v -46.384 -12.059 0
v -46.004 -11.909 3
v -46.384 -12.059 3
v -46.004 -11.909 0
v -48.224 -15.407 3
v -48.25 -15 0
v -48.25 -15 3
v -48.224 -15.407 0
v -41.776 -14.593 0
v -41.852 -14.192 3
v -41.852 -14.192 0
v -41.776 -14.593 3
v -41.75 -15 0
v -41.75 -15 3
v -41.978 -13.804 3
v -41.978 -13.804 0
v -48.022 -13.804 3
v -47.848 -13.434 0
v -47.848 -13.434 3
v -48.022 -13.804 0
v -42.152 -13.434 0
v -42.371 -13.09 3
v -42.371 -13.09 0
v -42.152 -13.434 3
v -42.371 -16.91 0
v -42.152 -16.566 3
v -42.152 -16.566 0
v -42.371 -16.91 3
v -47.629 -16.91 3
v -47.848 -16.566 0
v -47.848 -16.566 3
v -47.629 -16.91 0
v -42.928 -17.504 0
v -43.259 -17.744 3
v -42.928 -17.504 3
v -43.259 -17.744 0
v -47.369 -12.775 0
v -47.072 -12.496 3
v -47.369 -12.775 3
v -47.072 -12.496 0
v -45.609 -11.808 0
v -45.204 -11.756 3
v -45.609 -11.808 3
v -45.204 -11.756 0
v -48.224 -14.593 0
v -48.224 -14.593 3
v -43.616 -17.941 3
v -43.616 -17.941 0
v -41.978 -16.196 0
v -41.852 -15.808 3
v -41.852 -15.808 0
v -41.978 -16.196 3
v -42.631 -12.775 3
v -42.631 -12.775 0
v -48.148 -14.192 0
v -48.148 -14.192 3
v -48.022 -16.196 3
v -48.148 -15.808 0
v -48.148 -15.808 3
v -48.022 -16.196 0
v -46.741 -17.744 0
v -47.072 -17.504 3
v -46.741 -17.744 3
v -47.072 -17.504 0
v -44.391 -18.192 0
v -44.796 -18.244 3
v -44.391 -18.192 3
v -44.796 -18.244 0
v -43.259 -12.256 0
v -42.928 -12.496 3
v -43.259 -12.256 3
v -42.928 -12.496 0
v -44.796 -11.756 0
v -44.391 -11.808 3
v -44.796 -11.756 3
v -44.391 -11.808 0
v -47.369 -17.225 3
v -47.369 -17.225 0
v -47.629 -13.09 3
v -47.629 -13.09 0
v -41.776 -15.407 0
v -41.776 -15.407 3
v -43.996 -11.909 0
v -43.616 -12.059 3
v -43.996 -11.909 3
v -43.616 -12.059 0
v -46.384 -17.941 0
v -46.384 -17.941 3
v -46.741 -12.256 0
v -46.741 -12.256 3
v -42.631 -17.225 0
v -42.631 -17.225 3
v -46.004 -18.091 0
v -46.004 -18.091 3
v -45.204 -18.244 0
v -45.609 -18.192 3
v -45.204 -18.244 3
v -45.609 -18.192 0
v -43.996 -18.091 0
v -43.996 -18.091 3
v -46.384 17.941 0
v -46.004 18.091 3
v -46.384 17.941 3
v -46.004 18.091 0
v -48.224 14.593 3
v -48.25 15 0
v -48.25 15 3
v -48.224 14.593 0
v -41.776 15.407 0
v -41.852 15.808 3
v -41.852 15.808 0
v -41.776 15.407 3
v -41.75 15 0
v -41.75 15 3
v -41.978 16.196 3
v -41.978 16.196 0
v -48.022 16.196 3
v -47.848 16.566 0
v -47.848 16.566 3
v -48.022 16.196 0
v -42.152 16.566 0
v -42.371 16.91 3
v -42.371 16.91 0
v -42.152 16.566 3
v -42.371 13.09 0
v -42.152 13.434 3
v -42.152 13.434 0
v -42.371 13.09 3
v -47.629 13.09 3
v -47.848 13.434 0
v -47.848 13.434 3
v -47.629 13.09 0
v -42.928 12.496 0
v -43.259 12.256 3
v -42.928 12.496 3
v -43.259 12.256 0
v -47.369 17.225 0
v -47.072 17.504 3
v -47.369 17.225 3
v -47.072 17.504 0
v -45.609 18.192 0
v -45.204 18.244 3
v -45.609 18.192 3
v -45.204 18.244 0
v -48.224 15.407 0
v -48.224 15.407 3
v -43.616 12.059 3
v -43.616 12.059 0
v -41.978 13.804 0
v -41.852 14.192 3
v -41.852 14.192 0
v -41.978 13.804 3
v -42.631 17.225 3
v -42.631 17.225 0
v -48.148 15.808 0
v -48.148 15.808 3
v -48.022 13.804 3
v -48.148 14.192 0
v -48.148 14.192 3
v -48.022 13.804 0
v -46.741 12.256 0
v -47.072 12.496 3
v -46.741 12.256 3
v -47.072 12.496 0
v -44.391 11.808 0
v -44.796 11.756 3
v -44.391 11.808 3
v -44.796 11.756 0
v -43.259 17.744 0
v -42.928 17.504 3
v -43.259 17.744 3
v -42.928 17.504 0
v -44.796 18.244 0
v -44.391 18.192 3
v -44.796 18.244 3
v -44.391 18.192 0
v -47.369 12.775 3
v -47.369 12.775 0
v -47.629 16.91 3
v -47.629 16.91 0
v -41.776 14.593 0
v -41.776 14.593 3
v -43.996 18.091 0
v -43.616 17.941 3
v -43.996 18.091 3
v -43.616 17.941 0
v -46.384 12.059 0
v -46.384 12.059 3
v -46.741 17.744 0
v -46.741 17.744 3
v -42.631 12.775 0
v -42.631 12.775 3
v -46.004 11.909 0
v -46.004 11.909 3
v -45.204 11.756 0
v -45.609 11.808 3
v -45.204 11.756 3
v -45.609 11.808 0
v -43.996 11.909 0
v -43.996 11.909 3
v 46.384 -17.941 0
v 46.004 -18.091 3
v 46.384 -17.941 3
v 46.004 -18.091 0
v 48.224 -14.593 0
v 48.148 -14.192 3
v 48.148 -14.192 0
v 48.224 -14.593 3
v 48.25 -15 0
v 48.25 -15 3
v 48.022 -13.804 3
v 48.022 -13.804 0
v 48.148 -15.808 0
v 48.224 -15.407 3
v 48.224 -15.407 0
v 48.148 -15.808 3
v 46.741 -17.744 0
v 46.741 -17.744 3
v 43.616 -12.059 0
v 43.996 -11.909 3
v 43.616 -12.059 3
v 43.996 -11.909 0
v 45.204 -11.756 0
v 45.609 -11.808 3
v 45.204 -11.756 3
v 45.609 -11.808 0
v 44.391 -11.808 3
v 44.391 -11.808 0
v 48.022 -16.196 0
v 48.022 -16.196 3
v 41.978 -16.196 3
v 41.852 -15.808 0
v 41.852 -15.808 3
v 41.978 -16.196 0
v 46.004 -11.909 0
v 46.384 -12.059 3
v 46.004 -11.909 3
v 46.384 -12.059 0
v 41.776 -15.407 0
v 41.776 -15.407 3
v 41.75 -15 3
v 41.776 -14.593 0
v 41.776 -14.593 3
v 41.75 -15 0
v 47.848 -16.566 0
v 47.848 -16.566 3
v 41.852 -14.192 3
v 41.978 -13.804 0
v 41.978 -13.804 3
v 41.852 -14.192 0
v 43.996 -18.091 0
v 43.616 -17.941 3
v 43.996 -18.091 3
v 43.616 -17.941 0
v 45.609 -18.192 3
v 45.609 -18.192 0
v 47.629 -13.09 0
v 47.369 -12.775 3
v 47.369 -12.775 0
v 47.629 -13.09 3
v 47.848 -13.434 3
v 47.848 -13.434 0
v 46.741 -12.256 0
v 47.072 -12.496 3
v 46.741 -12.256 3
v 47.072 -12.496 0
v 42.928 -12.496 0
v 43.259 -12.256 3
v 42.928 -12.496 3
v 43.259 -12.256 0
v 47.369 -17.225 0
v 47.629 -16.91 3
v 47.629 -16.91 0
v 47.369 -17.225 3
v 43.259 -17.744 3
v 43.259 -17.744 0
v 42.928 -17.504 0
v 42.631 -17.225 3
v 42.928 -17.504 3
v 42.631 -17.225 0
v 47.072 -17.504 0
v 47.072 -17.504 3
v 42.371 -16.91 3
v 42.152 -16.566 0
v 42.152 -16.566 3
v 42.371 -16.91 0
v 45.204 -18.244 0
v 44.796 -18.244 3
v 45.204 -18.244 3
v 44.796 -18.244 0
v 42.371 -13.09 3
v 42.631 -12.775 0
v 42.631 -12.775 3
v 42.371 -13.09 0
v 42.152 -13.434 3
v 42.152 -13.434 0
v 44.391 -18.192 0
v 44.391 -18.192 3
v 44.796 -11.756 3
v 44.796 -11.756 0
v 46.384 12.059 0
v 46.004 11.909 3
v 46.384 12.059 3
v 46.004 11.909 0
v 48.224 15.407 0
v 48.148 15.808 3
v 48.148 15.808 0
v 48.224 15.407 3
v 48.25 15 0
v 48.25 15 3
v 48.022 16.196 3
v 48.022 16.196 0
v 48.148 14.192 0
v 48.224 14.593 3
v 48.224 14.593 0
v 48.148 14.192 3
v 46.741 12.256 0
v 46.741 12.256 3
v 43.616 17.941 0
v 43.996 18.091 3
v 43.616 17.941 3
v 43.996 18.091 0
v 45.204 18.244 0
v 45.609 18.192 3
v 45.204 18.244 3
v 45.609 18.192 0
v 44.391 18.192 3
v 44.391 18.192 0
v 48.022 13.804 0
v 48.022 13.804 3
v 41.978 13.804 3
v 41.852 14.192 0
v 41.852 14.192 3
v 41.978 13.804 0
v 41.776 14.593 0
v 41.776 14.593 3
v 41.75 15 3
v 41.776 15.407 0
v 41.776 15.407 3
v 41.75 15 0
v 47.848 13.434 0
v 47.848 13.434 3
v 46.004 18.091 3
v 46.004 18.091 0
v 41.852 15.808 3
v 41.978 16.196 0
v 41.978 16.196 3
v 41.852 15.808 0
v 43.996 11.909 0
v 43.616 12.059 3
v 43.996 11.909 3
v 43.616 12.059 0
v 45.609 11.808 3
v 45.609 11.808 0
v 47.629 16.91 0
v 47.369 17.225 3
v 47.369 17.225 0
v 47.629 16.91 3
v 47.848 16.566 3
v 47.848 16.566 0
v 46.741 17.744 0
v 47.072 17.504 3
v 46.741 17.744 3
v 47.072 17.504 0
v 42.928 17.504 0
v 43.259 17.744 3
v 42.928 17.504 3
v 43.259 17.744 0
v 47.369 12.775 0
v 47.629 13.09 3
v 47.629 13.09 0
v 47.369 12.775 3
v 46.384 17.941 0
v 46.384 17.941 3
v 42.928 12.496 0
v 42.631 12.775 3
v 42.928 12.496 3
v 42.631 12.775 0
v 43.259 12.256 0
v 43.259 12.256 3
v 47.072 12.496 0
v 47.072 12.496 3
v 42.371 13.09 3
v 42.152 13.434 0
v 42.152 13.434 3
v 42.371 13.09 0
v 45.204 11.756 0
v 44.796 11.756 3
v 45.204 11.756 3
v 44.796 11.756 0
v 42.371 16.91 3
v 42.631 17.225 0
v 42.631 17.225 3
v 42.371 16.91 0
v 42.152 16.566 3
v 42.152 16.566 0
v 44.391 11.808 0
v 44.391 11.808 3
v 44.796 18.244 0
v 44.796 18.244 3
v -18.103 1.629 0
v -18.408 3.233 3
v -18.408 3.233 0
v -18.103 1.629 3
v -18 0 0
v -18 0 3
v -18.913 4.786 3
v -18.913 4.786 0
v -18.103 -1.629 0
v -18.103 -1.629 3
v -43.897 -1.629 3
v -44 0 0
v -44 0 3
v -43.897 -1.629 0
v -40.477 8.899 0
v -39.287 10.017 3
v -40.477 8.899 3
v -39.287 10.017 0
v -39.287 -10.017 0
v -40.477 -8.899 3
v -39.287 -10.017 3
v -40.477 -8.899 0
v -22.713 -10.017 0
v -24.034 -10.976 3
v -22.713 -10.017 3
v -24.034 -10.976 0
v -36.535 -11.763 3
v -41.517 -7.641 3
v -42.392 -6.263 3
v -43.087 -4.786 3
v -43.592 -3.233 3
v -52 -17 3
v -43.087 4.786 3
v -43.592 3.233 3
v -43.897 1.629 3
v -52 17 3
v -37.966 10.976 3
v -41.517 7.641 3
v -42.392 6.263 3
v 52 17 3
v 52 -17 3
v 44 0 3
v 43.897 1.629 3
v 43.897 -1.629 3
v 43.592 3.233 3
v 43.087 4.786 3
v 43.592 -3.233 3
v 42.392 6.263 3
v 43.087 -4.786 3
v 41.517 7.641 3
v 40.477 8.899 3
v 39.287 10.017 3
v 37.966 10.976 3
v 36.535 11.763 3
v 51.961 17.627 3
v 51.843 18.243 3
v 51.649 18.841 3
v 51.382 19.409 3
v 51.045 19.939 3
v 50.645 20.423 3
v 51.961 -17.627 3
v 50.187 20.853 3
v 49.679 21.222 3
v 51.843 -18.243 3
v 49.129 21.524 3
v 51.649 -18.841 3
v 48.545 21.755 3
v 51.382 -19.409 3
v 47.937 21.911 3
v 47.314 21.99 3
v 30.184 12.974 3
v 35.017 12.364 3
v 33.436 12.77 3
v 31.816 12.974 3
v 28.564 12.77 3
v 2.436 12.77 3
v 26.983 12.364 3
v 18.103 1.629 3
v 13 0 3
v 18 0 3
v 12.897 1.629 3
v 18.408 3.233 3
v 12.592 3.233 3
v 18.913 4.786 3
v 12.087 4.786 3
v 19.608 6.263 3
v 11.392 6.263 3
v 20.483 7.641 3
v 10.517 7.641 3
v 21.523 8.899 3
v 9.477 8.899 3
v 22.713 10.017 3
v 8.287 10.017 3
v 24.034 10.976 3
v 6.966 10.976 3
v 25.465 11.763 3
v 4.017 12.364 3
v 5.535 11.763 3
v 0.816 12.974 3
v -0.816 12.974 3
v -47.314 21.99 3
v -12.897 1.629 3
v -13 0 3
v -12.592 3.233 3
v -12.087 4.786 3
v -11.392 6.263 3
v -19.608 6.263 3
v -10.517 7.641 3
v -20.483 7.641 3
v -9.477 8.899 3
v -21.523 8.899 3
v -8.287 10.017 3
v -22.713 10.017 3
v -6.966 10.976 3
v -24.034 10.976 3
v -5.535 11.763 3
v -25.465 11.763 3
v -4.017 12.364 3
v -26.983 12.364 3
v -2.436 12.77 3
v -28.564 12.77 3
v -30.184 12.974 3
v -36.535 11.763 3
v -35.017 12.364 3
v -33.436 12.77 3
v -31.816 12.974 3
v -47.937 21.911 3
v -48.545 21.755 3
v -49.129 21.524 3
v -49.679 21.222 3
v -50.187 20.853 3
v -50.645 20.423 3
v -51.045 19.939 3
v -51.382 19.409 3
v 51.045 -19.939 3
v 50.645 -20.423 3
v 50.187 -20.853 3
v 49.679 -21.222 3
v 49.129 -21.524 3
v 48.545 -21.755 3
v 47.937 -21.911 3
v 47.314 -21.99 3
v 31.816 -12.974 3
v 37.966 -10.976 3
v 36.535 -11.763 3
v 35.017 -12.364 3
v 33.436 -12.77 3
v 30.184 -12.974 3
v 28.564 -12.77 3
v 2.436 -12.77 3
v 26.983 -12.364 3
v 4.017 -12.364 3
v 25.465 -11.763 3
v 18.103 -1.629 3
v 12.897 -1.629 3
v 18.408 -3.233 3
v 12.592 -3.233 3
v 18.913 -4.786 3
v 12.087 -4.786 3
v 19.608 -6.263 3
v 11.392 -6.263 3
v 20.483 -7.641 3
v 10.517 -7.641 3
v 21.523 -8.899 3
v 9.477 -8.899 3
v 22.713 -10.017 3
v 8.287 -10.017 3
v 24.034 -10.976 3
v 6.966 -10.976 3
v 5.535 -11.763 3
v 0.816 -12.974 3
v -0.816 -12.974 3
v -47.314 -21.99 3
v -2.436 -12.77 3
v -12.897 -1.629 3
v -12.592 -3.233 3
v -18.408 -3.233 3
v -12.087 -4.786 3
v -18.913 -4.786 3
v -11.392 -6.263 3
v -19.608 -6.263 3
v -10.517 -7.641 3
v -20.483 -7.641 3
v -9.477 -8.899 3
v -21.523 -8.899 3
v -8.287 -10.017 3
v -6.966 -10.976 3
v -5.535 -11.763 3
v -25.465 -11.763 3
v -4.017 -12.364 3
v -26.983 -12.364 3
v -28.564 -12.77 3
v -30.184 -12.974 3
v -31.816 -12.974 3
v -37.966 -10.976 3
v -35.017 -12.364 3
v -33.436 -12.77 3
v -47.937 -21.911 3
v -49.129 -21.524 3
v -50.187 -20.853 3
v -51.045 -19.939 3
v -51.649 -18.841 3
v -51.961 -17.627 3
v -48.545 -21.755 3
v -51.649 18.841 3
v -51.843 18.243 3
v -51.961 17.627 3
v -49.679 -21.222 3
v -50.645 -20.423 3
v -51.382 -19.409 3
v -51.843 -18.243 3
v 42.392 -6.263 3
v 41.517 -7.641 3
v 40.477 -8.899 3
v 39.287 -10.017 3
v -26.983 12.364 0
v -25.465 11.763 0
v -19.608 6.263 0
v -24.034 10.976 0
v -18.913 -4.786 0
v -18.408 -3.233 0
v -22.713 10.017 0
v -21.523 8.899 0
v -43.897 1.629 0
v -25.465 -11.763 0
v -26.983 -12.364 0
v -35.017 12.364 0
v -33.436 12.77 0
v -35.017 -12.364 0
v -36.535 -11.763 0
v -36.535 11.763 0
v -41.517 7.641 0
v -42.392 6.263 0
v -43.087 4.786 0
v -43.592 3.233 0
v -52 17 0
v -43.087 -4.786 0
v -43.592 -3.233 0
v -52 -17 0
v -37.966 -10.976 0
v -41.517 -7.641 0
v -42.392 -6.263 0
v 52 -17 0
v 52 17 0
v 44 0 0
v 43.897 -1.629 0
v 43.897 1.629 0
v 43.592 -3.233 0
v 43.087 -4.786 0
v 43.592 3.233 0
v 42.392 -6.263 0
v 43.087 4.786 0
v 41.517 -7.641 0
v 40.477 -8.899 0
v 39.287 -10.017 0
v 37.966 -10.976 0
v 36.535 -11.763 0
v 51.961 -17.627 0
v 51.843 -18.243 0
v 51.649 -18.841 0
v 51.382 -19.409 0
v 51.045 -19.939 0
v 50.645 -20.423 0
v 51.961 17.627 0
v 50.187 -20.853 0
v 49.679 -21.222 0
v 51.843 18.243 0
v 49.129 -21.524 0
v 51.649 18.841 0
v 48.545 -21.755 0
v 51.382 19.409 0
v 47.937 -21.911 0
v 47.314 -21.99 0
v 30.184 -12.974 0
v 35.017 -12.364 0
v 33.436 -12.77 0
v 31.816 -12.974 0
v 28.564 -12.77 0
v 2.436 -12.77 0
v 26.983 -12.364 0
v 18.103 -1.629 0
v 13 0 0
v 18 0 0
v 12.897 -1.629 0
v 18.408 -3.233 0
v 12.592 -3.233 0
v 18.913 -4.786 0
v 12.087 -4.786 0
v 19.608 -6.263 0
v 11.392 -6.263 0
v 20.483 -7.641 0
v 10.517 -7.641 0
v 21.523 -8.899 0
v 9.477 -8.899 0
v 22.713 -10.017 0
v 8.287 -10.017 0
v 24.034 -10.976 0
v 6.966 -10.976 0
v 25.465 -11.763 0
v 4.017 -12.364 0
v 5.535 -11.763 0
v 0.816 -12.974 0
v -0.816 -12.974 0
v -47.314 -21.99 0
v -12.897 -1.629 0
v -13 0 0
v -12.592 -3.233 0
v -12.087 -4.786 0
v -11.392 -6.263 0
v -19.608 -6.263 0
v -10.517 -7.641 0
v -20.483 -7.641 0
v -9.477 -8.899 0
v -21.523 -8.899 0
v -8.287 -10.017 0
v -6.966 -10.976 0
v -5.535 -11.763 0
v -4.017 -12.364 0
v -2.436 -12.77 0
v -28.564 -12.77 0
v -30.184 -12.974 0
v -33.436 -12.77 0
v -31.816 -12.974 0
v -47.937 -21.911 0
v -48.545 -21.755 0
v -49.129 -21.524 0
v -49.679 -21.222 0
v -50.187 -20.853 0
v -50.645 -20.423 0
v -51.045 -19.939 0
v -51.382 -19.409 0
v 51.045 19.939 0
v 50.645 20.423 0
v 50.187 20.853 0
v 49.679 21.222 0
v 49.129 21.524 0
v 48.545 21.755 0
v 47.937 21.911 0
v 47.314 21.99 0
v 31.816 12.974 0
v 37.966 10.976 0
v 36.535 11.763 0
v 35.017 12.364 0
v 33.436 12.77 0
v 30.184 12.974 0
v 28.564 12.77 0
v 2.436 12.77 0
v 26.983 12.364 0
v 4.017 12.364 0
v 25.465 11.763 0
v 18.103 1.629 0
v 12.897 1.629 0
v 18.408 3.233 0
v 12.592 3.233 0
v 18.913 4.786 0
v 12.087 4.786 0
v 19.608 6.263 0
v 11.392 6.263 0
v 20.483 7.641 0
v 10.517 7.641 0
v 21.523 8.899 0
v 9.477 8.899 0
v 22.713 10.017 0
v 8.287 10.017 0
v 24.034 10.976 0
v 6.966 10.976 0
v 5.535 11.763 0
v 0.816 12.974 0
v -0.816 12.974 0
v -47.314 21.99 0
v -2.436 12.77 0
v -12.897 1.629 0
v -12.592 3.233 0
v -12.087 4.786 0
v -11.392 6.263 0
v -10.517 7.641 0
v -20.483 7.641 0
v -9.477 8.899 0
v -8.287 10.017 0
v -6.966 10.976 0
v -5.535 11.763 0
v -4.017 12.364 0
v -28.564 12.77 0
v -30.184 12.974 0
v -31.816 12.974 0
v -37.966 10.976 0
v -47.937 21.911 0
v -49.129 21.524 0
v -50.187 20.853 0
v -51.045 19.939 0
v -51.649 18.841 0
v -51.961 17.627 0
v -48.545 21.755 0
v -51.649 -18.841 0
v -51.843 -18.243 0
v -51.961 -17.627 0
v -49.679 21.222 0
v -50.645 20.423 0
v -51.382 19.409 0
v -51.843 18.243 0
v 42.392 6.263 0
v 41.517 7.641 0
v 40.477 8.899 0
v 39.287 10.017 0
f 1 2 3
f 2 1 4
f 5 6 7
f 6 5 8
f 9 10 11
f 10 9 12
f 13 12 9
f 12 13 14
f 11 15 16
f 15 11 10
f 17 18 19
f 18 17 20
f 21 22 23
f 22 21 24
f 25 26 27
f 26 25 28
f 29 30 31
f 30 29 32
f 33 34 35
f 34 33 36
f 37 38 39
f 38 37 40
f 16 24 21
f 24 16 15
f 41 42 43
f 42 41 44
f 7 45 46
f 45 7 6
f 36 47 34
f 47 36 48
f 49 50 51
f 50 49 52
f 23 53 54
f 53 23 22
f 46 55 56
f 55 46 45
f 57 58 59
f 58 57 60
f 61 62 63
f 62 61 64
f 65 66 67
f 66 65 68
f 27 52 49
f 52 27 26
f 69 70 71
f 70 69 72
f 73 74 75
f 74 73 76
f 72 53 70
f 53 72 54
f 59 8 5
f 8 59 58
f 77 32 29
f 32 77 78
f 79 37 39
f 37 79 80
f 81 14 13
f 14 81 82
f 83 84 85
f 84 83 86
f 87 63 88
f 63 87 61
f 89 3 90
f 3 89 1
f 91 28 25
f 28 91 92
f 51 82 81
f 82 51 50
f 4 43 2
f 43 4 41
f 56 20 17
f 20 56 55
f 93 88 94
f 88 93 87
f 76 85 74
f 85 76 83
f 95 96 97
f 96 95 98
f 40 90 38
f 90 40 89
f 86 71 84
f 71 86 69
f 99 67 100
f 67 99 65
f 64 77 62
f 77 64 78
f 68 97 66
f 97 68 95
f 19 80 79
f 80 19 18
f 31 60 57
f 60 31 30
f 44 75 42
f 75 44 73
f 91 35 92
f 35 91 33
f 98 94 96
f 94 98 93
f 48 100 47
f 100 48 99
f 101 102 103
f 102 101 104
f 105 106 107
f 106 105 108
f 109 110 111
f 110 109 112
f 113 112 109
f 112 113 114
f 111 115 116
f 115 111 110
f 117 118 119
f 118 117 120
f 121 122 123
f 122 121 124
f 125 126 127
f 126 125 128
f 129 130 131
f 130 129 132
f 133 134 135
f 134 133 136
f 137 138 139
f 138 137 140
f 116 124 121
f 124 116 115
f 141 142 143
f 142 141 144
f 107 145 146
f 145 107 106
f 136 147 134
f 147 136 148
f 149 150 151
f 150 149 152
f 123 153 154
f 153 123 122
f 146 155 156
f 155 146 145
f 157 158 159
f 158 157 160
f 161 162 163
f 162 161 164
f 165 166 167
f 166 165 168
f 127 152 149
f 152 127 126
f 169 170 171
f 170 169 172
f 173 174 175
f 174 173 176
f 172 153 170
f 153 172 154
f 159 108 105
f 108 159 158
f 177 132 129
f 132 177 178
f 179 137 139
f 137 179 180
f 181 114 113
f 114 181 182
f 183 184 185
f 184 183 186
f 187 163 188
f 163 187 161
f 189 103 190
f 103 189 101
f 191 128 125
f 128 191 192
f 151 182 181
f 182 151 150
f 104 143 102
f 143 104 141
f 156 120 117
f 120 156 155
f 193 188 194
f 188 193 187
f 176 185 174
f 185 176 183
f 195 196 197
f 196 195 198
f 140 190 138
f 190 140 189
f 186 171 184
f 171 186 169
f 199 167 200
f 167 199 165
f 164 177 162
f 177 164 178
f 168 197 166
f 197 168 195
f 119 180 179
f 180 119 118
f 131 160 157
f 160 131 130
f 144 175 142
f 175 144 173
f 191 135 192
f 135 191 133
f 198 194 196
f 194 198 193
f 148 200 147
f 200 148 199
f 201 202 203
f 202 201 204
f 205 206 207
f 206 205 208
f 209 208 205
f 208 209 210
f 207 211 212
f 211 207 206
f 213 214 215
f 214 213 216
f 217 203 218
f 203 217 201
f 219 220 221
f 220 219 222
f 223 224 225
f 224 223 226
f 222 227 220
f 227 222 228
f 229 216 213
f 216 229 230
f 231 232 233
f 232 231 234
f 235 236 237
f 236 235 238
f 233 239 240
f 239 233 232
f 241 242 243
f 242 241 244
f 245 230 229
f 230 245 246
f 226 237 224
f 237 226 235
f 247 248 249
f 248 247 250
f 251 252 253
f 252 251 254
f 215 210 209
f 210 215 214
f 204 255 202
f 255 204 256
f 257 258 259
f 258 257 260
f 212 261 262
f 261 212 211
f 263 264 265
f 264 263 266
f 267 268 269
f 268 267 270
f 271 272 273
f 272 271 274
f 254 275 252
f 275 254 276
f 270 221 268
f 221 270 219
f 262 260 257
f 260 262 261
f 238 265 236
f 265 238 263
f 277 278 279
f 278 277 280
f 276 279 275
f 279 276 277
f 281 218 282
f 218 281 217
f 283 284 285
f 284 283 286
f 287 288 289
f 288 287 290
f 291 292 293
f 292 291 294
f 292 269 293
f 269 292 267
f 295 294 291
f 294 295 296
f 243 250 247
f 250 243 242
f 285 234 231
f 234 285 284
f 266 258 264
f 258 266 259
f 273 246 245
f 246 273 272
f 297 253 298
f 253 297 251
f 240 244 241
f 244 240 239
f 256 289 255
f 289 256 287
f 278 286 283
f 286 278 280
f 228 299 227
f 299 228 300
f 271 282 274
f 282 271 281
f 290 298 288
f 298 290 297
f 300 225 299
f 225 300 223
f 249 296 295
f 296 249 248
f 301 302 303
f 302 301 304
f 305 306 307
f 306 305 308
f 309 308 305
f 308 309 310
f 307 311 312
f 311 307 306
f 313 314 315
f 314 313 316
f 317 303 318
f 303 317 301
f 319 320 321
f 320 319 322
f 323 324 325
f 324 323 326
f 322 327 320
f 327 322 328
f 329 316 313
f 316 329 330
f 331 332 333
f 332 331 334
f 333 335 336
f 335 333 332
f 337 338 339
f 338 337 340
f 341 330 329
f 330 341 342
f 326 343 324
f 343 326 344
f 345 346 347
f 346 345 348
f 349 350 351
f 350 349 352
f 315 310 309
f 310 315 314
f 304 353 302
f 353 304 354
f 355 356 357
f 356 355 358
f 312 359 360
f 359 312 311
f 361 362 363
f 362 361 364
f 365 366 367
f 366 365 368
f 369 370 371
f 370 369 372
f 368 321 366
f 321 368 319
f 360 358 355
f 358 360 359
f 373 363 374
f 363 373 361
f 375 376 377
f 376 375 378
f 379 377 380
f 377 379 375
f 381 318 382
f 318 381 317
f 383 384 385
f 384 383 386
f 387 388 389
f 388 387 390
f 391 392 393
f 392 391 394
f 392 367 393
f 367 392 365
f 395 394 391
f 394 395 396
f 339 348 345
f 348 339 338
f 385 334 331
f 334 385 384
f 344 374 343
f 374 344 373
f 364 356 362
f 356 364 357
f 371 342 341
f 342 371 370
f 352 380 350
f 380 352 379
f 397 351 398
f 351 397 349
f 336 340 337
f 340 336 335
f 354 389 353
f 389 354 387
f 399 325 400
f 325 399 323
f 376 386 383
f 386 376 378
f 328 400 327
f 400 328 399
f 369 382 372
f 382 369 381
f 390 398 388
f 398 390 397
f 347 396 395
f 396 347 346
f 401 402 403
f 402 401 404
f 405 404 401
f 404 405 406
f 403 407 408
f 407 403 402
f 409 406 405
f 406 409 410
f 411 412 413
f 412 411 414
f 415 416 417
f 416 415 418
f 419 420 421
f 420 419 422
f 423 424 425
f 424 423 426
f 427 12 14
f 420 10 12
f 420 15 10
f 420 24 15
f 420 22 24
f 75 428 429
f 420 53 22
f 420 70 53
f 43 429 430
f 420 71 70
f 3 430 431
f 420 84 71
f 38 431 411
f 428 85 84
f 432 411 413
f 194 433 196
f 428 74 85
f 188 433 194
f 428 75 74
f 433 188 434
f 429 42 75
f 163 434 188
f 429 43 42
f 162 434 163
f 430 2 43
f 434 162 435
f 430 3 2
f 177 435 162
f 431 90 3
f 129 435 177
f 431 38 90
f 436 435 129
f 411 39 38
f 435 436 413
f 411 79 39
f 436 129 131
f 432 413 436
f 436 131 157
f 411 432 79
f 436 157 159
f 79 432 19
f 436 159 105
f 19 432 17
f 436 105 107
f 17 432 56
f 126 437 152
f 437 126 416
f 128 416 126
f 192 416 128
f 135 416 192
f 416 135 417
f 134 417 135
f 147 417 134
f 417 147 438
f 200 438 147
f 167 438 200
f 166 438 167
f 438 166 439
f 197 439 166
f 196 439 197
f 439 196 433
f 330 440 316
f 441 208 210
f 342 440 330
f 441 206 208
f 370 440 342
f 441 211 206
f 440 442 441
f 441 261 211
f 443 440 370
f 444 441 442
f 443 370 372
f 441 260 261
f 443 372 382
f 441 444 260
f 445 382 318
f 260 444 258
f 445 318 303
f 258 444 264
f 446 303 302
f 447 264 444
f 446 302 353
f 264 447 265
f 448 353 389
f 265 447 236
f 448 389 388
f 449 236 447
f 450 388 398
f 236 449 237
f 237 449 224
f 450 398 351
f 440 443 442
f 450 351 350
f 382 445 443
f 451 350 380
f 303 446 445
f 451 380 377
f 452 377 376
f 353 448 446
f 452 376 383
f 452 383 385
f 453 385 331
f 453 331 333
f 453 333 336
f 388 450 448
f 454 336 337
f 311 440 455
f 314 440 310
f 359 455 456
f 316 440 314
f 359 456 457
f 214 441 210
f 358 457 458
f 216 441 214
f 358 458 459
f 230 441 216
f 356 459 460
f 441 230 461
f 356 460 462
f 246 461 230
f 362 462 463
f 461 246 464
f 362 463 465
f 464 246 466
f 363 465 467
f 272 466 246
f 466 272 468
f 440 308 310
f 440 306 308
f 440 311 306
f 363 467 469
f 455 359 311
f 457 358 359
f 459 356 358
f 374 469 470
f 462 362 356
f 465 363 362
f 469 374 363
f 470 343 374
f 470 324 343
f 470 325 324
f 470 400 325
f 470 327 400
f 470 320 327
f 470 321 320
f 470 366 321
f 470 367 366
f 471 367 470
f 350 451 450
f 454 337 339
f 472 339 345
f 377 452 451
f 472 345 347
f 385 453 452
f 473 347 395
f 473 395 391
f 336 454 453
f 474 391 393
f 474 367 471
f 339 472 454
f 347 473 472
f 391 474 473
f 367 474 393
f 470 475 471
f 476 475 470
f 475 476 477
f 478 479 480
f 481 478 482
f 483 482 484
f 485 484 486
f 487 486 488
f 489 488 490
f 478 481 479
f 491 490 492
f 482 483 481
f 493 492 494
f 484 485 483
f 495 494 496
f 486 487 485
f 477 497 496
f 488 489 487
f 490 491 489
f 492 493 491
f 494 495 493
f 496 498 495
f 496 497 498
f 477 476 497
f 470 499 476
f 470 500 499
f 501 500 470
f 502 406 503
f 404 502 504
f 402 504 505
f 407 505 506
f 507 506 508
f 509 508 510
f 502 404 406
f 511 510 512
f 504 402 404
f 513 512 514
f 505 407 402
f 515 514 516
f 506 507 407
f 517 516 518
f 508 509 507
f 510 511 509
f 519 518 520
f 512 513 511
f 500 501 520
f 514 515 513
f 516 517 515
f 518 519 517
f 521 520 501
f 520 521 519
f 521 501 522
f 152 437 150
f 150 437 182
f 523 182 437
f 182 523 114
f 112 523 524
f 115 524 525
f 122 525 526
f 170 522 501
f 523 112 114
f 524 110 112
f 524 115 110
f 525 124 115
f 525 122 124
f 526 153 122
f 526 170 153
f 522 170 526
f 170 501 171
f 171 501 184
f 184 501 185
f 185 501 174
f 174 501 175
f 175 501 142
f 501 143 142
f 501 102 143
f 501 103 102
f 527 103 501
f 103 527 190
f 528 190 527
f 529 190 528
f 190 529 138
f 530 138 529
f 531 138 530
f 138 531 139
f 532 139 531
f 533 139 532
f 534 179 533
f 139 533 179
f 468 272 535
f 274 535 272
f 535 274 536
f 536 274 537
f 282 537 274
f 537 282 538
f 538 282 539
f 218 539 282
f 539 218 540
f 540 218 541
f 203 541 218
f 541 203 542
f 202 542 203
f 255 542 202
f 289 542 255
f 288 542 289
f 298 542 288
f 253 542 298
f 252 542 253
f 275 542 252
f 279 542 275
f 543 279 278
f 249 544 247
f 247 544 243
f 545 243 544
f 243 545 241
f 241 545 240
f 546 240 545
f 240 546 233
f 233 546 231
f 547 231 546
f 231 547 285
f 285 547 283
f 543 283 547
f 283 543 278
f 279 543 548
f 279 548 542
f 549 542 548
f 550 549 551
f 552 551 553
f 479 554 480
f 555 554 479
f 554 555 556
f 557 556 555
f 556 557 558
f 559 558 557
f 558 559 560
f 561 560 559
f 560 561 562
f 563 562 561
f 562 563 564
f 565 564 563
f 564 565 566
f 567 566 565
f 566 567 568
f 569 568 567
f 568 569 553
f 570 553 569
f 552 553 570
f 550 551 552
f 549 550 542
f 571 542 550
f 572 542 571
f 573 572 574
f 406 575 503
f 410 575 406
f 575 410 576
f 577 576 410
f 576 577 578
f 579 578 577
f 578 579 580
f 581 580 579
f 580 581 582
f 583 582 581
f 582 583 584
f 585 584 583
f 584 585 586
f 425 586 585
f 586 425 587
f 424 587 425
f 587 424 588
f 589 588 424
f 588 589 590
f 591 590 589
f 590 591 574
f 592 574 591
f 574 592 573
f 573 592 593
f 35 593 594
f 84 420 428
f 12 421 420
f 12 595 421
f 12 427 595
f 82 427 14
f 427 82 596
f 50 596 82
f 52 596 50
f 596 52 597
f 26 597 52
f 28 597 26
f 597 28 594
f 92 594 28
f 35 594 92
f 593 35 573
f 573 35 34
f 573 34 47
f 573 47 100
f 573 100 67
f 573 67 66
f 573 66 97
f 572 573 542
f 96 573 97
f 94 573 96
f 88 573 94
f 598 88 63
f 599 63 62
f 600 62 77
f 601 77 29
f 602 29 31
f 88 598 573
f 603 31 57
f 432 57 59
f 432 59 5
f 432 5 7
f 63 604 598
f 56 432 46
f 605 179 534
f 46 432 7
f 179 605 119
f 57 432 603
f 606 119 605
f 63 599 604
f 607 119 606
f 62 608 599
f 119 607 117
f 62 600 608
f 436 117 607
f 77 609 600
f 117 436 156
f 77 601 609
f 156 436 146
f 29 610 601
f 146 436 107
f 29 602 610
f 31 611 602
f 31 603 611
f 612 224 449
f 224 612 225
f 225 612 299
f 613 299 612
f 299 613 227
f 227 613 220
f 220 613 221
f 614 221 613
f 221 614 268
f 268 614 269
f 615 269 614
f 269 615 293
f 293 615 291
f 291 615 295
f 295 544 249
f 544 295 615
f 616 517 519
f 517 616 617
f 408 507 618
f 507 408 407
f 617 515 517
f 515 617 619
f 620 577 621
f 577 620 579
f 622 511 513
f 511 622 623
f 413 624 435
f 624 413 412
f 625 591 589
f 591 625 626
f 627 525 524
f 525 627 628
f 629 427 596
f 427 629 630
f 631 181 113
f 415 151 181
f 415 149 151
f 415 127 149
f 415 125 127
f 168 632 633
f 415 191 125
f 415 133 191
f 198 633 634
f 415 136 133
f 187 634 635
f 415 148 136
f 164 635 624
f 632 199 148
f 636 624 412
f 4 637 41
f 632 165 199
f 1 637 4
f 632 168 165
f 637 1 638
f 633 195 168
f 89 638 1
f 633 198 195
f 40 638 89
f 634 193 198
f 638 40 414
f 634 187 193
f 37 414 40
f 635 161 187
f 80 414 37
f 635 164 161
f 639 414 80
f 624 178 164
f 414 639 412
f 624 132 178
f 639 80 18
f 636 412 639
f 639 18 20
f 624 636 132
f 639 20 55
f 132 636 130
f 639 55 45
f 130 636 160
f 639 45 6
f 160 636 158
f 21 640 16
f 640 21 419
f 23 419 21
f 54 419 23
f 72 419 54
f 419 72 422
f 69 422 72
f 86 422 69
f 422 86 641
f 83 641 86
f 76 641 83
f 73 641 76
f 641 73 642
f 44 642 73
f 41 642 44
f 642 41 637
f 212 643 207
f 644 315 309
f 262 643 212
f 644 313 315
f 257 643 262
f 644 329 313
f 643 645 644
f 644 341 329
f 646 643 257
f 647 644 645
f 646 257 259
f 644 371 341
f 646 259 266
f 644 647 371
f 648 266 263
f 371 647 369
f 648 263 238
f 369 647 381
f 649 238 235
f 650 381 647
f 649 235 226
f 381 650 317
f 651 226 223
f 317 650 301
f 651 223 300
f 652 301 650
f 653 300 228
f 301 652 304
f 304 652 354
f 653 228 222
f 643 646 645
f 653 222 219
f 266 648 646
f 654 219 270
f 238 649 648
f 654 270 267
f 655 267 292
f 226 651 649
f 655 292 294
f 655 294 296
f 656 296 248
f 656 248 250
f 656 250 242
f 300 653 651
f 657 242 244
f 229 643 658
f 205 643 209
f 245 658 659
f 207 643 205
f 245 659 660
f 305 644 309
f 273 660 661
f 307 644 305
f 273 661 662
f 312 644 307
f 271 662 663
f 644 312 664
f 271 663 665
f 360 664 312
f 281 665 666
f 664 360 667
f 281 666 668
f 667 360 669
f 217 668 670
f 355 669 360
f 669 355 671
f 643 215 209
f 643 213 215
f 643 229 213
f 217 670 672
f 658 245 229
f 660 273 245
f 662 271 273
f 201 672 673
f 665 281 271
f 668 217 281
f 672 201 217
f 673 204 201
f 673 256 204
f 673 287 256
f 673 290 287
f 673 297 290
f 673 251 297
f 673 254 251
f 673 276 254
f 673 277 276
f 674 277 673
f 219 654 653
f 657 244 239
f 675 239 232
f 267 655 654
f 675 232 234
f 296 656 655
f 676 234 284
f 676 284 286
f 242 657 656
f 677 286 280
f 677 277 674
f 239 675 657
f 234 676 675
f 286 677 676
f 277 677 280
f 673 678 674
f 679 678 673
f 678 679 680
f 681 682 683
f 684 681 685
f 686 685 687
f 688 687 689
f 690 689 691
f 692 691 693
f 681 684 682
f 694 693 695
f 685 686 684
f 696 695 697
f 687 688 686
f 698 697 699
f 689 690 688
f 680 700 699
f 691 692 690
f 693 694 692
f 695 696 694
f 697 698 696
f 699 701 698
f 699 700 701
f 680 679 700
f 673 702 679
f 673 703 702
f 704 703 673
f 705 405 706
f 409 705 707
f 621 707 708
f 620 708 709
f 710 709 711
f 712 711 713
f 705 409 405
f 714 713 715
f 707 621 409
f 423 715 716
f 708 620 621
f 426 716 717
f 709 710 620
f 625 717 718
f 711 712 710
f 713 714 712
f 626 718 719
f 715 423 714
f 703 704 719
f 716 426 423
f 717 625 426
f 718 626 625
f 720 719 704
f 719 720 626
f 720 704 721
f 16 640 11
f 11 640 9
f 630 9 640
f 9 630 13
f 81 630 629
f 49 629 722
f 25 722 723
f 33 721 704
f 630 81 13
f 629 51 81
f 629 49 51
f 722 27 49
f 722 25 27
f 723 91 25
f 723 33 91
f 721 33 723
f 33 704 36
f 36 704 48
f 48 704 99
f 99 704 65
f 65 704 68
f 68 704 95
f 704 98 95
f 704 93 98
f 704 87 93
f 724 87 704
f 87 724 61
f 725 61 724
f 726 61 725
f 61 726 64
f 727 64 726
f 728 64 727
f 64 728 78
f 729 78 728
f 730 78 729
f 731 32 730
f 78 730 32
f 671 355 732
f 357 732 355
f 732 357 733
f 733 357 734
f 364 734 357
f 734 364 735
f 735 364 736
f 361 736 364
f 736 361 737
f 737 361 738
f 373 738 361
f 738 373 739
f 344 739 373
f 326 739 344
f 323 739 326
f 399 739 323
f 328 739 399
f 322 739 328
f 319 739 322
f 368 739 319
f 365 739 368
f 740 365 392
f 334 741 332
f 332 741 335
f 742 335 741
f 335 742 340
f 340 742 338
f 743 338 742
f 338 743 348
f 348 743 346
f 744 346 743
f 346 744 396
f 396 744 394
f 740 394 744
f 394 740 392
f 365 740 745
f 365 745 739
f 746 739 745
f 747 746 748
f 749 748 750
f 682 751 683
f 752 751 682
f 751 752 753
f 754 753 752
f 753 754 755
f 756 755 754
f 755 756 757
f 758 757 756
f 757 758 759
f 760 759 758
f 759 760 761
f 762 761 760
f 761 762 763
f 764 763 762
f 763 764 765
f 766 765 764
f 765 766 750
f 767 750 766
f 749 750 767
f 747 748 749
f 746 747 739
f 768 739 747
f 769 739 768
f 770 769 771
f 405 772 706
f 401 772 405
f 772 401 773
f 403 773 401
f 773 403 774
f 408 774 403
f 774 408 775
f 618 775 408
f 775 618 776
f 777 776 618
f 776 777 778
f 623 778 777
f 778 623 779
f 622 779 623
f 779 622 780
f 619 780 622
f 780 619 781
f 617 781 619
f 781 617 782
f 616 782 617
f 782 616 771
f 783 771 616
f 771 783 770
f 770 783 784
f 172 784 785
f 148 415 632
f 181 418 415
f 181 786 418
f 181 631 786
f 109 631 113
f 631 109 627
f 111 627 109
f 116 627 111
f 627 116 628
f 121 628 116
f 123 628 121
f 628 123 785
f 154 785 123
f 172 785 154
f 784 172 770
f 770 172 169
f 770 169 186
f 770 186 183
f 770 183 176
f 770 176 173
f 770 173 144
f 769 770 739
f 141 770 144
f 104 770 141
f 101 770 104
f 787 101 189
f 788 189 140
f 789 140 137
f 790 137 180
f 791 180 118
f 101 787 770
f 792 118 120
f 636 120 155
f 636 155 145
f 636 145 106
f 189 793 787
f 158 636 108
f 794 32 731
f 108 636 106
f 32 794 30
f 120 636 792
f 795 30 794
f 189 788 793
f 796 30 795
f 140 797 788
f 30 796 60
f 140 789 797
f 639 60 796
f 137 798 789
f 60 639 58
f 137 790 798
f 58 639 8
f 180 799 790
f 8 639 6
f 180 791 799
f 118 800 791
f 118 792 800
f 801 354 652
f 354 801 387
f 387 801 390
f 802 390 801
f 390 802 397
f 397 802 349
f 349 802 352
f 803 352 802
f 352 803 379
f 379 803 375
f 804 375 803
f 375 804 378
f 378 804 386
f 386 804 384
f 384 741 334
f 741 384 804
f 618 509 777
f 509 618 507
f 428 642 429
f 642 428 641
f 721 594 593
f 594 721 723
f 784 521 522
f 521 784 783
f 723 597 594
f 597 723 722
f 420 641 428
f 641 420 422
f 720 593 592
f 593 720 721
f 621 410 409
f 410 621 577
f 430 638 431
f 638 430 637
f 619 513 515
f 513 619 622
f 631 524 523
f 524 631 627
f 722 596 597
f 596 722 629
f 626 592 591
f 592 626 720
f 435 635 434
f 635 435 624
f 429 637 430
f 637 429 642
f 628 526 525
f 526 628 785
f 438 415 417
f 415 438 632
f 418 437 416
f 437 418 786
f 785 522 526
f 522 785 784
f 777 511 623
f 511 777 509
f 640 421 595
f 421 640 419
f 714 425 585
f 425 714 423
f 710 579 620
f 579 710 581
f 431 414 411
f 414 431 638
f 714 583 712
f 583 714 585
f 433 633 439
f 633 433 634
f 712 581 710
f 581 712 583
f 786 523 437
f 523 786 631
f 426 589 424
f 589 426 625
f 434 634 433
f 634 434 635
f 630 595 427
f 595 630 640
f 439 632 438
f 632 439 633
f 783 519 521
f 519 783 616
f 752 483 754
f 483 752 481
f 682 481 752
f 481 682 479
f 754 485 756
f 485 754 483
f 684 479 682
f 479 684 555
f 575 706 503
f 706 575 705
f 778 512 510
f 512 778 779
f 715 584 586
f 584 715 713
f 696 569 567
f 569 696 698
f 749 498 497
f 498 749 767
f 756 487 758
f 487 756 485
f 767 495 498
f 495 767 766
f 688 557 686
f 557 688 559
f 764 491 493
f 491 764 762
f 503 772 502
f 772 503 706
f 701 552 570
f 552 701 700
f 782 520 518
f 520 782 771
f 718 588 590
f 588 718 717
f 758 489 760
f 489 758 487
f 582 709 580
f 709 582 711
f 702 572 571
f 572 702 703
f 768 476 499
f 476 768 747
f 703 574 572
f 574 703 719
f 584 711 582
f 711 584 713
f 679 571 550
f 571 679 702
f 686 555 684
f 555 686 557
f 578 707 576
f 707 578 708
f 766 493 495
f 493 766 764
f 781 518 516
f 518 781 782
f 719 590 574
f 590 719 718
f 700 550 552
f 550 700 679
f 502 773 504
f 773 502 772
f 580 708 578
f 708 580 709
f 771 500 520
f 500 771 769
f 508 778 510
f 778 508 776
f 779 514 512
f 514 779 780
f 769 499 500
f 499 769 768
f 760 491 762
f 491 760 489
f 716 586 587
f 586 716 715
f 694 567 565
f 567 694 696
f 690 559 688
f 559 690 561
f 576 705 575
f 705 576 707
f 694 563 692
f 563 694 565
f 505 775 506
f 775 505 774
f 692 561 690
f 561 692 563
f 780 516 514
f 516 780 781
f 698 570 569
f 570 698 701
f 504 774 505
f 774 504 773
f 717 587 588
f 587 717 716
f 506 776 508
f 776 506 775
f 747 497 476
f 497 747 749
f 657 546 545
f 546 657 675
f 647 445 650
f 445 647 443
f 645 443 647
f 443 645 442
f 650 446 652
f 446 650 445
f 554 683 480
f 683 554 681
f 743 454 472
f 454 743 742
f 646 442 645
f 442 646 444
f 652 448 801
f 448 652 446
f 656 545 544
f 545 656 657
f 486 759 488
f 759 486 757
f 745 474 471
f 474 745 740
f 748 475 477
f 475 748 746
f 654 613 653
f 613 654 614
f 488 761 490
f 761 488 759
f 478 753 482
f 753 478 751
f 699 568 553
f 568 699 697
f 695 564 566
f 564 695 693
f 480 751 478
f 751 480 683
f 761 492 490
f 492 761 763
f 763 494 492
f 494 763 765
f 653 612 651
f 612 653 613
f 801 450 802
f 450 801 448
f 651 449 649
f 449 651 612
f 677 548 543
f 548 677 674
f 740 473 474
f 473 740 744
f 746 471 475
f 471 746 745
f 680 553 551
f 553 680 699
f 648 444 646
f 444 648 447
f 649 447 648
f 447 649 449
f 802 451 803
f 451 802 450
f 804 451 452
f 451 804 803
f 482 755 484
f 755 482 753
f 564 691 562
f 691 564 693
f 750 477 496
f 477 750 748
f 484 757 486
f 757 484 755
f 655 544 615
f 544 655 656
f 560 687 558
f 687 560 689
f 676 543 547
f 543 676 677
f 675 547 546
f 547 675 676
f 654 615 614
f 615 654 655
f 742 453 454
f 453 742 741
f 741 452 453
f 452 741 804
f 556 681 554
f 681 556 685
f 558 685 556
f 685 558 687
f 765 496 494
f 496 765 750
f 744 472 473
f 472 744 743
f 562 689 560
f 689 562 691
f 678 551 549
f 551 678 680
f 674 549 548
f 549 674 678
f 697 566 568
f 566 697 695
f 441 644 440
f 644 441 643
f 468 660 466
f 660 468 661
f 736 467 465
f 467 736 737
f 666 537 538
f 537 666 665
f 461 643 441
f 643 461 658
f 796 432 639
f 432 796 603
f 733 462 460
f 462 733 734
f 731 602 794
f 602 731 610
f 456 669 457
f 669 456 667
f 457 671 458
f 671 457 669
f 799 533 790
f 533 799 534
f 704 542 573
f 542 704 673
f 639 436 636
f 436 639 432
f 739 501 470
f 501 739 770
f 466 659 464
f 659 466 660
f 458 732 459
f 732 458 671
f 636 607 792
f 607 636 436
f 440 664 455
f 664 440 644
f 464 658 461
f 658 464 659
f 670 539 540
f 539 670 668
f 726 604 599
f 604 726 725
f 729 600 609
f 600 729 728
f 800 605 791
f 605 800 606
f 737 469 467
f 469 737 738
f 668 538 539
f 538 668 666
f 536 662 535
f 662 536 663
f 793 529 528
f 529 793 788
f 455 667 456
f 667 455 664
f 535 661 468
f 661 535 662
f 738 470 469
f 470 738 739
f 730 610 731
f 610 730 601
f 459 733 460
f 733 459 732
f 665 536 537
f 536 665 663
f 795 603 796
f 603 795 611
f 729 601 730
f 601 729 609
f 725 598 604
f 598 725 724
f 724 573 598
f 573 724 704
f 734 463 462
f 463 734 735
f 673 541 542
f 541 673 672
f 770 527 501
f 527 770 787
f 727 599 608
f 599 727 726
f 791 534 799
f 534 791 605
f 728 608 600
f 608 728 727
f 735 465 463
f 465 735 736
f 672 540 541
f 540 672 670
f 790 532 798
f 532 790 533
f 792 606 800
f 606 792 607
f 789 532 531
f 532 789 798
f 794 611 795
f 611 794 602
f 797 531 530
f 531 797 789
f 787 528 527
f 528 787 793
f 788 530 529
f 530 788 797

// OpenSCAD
$fn = 50;


difference() {
	union() {
		hull() {
			translate(v = [-47.0000000000, 17.0000000000, 0]) {
				cylinder(h = 3, r = 5);
			}
			translate(v = [47.0000000000, 17.0000000000, 0]) {
				cylinder(h = 3, r = 5);
			}
			translate(v = [-47.0000000000, -17.0000000000, 0]) {
				cylinder(h = 3, r = 5);
			}
			translate(v = [47.0000000000, -17.0000000000, 0]) {
				cylinder(h = 3, r = 5);
			}
		}
	}
	union() {
		#translate(v = [-45.0000000000, -15.0000000000, -100.0000000000]) {
			cylinder(h = 200, r = 3.2500000000);
		}
		#translate(v = [-45.0000000000, 15.0000000000, -100.0000000000]) {
			cylinder(h = 200, r = 3.2500000000);
		}
		#translate(v = [45.0000000000, -15.0000000000, -100.0000000000]) {
			cylinder(h = 200, r = 3.2500000000);
		}
		#translate(v = [45.0000000000, 15.0000000000, -100.0000000000]) {
			cylinder(h = 200, r = 3.2500000000);
		}
		#translate(v = [-31.0000000000, 0, 0]) {
			cylinder(h = 3, r = 13.0000000000);
		}
		#cylinder(h = 3, r = 13.0000000000);
		#translate(v = [31.0000000000, 0, 0]) {
			cylinder(h = 3, r = 13.0000000000);
		}
	}
}
